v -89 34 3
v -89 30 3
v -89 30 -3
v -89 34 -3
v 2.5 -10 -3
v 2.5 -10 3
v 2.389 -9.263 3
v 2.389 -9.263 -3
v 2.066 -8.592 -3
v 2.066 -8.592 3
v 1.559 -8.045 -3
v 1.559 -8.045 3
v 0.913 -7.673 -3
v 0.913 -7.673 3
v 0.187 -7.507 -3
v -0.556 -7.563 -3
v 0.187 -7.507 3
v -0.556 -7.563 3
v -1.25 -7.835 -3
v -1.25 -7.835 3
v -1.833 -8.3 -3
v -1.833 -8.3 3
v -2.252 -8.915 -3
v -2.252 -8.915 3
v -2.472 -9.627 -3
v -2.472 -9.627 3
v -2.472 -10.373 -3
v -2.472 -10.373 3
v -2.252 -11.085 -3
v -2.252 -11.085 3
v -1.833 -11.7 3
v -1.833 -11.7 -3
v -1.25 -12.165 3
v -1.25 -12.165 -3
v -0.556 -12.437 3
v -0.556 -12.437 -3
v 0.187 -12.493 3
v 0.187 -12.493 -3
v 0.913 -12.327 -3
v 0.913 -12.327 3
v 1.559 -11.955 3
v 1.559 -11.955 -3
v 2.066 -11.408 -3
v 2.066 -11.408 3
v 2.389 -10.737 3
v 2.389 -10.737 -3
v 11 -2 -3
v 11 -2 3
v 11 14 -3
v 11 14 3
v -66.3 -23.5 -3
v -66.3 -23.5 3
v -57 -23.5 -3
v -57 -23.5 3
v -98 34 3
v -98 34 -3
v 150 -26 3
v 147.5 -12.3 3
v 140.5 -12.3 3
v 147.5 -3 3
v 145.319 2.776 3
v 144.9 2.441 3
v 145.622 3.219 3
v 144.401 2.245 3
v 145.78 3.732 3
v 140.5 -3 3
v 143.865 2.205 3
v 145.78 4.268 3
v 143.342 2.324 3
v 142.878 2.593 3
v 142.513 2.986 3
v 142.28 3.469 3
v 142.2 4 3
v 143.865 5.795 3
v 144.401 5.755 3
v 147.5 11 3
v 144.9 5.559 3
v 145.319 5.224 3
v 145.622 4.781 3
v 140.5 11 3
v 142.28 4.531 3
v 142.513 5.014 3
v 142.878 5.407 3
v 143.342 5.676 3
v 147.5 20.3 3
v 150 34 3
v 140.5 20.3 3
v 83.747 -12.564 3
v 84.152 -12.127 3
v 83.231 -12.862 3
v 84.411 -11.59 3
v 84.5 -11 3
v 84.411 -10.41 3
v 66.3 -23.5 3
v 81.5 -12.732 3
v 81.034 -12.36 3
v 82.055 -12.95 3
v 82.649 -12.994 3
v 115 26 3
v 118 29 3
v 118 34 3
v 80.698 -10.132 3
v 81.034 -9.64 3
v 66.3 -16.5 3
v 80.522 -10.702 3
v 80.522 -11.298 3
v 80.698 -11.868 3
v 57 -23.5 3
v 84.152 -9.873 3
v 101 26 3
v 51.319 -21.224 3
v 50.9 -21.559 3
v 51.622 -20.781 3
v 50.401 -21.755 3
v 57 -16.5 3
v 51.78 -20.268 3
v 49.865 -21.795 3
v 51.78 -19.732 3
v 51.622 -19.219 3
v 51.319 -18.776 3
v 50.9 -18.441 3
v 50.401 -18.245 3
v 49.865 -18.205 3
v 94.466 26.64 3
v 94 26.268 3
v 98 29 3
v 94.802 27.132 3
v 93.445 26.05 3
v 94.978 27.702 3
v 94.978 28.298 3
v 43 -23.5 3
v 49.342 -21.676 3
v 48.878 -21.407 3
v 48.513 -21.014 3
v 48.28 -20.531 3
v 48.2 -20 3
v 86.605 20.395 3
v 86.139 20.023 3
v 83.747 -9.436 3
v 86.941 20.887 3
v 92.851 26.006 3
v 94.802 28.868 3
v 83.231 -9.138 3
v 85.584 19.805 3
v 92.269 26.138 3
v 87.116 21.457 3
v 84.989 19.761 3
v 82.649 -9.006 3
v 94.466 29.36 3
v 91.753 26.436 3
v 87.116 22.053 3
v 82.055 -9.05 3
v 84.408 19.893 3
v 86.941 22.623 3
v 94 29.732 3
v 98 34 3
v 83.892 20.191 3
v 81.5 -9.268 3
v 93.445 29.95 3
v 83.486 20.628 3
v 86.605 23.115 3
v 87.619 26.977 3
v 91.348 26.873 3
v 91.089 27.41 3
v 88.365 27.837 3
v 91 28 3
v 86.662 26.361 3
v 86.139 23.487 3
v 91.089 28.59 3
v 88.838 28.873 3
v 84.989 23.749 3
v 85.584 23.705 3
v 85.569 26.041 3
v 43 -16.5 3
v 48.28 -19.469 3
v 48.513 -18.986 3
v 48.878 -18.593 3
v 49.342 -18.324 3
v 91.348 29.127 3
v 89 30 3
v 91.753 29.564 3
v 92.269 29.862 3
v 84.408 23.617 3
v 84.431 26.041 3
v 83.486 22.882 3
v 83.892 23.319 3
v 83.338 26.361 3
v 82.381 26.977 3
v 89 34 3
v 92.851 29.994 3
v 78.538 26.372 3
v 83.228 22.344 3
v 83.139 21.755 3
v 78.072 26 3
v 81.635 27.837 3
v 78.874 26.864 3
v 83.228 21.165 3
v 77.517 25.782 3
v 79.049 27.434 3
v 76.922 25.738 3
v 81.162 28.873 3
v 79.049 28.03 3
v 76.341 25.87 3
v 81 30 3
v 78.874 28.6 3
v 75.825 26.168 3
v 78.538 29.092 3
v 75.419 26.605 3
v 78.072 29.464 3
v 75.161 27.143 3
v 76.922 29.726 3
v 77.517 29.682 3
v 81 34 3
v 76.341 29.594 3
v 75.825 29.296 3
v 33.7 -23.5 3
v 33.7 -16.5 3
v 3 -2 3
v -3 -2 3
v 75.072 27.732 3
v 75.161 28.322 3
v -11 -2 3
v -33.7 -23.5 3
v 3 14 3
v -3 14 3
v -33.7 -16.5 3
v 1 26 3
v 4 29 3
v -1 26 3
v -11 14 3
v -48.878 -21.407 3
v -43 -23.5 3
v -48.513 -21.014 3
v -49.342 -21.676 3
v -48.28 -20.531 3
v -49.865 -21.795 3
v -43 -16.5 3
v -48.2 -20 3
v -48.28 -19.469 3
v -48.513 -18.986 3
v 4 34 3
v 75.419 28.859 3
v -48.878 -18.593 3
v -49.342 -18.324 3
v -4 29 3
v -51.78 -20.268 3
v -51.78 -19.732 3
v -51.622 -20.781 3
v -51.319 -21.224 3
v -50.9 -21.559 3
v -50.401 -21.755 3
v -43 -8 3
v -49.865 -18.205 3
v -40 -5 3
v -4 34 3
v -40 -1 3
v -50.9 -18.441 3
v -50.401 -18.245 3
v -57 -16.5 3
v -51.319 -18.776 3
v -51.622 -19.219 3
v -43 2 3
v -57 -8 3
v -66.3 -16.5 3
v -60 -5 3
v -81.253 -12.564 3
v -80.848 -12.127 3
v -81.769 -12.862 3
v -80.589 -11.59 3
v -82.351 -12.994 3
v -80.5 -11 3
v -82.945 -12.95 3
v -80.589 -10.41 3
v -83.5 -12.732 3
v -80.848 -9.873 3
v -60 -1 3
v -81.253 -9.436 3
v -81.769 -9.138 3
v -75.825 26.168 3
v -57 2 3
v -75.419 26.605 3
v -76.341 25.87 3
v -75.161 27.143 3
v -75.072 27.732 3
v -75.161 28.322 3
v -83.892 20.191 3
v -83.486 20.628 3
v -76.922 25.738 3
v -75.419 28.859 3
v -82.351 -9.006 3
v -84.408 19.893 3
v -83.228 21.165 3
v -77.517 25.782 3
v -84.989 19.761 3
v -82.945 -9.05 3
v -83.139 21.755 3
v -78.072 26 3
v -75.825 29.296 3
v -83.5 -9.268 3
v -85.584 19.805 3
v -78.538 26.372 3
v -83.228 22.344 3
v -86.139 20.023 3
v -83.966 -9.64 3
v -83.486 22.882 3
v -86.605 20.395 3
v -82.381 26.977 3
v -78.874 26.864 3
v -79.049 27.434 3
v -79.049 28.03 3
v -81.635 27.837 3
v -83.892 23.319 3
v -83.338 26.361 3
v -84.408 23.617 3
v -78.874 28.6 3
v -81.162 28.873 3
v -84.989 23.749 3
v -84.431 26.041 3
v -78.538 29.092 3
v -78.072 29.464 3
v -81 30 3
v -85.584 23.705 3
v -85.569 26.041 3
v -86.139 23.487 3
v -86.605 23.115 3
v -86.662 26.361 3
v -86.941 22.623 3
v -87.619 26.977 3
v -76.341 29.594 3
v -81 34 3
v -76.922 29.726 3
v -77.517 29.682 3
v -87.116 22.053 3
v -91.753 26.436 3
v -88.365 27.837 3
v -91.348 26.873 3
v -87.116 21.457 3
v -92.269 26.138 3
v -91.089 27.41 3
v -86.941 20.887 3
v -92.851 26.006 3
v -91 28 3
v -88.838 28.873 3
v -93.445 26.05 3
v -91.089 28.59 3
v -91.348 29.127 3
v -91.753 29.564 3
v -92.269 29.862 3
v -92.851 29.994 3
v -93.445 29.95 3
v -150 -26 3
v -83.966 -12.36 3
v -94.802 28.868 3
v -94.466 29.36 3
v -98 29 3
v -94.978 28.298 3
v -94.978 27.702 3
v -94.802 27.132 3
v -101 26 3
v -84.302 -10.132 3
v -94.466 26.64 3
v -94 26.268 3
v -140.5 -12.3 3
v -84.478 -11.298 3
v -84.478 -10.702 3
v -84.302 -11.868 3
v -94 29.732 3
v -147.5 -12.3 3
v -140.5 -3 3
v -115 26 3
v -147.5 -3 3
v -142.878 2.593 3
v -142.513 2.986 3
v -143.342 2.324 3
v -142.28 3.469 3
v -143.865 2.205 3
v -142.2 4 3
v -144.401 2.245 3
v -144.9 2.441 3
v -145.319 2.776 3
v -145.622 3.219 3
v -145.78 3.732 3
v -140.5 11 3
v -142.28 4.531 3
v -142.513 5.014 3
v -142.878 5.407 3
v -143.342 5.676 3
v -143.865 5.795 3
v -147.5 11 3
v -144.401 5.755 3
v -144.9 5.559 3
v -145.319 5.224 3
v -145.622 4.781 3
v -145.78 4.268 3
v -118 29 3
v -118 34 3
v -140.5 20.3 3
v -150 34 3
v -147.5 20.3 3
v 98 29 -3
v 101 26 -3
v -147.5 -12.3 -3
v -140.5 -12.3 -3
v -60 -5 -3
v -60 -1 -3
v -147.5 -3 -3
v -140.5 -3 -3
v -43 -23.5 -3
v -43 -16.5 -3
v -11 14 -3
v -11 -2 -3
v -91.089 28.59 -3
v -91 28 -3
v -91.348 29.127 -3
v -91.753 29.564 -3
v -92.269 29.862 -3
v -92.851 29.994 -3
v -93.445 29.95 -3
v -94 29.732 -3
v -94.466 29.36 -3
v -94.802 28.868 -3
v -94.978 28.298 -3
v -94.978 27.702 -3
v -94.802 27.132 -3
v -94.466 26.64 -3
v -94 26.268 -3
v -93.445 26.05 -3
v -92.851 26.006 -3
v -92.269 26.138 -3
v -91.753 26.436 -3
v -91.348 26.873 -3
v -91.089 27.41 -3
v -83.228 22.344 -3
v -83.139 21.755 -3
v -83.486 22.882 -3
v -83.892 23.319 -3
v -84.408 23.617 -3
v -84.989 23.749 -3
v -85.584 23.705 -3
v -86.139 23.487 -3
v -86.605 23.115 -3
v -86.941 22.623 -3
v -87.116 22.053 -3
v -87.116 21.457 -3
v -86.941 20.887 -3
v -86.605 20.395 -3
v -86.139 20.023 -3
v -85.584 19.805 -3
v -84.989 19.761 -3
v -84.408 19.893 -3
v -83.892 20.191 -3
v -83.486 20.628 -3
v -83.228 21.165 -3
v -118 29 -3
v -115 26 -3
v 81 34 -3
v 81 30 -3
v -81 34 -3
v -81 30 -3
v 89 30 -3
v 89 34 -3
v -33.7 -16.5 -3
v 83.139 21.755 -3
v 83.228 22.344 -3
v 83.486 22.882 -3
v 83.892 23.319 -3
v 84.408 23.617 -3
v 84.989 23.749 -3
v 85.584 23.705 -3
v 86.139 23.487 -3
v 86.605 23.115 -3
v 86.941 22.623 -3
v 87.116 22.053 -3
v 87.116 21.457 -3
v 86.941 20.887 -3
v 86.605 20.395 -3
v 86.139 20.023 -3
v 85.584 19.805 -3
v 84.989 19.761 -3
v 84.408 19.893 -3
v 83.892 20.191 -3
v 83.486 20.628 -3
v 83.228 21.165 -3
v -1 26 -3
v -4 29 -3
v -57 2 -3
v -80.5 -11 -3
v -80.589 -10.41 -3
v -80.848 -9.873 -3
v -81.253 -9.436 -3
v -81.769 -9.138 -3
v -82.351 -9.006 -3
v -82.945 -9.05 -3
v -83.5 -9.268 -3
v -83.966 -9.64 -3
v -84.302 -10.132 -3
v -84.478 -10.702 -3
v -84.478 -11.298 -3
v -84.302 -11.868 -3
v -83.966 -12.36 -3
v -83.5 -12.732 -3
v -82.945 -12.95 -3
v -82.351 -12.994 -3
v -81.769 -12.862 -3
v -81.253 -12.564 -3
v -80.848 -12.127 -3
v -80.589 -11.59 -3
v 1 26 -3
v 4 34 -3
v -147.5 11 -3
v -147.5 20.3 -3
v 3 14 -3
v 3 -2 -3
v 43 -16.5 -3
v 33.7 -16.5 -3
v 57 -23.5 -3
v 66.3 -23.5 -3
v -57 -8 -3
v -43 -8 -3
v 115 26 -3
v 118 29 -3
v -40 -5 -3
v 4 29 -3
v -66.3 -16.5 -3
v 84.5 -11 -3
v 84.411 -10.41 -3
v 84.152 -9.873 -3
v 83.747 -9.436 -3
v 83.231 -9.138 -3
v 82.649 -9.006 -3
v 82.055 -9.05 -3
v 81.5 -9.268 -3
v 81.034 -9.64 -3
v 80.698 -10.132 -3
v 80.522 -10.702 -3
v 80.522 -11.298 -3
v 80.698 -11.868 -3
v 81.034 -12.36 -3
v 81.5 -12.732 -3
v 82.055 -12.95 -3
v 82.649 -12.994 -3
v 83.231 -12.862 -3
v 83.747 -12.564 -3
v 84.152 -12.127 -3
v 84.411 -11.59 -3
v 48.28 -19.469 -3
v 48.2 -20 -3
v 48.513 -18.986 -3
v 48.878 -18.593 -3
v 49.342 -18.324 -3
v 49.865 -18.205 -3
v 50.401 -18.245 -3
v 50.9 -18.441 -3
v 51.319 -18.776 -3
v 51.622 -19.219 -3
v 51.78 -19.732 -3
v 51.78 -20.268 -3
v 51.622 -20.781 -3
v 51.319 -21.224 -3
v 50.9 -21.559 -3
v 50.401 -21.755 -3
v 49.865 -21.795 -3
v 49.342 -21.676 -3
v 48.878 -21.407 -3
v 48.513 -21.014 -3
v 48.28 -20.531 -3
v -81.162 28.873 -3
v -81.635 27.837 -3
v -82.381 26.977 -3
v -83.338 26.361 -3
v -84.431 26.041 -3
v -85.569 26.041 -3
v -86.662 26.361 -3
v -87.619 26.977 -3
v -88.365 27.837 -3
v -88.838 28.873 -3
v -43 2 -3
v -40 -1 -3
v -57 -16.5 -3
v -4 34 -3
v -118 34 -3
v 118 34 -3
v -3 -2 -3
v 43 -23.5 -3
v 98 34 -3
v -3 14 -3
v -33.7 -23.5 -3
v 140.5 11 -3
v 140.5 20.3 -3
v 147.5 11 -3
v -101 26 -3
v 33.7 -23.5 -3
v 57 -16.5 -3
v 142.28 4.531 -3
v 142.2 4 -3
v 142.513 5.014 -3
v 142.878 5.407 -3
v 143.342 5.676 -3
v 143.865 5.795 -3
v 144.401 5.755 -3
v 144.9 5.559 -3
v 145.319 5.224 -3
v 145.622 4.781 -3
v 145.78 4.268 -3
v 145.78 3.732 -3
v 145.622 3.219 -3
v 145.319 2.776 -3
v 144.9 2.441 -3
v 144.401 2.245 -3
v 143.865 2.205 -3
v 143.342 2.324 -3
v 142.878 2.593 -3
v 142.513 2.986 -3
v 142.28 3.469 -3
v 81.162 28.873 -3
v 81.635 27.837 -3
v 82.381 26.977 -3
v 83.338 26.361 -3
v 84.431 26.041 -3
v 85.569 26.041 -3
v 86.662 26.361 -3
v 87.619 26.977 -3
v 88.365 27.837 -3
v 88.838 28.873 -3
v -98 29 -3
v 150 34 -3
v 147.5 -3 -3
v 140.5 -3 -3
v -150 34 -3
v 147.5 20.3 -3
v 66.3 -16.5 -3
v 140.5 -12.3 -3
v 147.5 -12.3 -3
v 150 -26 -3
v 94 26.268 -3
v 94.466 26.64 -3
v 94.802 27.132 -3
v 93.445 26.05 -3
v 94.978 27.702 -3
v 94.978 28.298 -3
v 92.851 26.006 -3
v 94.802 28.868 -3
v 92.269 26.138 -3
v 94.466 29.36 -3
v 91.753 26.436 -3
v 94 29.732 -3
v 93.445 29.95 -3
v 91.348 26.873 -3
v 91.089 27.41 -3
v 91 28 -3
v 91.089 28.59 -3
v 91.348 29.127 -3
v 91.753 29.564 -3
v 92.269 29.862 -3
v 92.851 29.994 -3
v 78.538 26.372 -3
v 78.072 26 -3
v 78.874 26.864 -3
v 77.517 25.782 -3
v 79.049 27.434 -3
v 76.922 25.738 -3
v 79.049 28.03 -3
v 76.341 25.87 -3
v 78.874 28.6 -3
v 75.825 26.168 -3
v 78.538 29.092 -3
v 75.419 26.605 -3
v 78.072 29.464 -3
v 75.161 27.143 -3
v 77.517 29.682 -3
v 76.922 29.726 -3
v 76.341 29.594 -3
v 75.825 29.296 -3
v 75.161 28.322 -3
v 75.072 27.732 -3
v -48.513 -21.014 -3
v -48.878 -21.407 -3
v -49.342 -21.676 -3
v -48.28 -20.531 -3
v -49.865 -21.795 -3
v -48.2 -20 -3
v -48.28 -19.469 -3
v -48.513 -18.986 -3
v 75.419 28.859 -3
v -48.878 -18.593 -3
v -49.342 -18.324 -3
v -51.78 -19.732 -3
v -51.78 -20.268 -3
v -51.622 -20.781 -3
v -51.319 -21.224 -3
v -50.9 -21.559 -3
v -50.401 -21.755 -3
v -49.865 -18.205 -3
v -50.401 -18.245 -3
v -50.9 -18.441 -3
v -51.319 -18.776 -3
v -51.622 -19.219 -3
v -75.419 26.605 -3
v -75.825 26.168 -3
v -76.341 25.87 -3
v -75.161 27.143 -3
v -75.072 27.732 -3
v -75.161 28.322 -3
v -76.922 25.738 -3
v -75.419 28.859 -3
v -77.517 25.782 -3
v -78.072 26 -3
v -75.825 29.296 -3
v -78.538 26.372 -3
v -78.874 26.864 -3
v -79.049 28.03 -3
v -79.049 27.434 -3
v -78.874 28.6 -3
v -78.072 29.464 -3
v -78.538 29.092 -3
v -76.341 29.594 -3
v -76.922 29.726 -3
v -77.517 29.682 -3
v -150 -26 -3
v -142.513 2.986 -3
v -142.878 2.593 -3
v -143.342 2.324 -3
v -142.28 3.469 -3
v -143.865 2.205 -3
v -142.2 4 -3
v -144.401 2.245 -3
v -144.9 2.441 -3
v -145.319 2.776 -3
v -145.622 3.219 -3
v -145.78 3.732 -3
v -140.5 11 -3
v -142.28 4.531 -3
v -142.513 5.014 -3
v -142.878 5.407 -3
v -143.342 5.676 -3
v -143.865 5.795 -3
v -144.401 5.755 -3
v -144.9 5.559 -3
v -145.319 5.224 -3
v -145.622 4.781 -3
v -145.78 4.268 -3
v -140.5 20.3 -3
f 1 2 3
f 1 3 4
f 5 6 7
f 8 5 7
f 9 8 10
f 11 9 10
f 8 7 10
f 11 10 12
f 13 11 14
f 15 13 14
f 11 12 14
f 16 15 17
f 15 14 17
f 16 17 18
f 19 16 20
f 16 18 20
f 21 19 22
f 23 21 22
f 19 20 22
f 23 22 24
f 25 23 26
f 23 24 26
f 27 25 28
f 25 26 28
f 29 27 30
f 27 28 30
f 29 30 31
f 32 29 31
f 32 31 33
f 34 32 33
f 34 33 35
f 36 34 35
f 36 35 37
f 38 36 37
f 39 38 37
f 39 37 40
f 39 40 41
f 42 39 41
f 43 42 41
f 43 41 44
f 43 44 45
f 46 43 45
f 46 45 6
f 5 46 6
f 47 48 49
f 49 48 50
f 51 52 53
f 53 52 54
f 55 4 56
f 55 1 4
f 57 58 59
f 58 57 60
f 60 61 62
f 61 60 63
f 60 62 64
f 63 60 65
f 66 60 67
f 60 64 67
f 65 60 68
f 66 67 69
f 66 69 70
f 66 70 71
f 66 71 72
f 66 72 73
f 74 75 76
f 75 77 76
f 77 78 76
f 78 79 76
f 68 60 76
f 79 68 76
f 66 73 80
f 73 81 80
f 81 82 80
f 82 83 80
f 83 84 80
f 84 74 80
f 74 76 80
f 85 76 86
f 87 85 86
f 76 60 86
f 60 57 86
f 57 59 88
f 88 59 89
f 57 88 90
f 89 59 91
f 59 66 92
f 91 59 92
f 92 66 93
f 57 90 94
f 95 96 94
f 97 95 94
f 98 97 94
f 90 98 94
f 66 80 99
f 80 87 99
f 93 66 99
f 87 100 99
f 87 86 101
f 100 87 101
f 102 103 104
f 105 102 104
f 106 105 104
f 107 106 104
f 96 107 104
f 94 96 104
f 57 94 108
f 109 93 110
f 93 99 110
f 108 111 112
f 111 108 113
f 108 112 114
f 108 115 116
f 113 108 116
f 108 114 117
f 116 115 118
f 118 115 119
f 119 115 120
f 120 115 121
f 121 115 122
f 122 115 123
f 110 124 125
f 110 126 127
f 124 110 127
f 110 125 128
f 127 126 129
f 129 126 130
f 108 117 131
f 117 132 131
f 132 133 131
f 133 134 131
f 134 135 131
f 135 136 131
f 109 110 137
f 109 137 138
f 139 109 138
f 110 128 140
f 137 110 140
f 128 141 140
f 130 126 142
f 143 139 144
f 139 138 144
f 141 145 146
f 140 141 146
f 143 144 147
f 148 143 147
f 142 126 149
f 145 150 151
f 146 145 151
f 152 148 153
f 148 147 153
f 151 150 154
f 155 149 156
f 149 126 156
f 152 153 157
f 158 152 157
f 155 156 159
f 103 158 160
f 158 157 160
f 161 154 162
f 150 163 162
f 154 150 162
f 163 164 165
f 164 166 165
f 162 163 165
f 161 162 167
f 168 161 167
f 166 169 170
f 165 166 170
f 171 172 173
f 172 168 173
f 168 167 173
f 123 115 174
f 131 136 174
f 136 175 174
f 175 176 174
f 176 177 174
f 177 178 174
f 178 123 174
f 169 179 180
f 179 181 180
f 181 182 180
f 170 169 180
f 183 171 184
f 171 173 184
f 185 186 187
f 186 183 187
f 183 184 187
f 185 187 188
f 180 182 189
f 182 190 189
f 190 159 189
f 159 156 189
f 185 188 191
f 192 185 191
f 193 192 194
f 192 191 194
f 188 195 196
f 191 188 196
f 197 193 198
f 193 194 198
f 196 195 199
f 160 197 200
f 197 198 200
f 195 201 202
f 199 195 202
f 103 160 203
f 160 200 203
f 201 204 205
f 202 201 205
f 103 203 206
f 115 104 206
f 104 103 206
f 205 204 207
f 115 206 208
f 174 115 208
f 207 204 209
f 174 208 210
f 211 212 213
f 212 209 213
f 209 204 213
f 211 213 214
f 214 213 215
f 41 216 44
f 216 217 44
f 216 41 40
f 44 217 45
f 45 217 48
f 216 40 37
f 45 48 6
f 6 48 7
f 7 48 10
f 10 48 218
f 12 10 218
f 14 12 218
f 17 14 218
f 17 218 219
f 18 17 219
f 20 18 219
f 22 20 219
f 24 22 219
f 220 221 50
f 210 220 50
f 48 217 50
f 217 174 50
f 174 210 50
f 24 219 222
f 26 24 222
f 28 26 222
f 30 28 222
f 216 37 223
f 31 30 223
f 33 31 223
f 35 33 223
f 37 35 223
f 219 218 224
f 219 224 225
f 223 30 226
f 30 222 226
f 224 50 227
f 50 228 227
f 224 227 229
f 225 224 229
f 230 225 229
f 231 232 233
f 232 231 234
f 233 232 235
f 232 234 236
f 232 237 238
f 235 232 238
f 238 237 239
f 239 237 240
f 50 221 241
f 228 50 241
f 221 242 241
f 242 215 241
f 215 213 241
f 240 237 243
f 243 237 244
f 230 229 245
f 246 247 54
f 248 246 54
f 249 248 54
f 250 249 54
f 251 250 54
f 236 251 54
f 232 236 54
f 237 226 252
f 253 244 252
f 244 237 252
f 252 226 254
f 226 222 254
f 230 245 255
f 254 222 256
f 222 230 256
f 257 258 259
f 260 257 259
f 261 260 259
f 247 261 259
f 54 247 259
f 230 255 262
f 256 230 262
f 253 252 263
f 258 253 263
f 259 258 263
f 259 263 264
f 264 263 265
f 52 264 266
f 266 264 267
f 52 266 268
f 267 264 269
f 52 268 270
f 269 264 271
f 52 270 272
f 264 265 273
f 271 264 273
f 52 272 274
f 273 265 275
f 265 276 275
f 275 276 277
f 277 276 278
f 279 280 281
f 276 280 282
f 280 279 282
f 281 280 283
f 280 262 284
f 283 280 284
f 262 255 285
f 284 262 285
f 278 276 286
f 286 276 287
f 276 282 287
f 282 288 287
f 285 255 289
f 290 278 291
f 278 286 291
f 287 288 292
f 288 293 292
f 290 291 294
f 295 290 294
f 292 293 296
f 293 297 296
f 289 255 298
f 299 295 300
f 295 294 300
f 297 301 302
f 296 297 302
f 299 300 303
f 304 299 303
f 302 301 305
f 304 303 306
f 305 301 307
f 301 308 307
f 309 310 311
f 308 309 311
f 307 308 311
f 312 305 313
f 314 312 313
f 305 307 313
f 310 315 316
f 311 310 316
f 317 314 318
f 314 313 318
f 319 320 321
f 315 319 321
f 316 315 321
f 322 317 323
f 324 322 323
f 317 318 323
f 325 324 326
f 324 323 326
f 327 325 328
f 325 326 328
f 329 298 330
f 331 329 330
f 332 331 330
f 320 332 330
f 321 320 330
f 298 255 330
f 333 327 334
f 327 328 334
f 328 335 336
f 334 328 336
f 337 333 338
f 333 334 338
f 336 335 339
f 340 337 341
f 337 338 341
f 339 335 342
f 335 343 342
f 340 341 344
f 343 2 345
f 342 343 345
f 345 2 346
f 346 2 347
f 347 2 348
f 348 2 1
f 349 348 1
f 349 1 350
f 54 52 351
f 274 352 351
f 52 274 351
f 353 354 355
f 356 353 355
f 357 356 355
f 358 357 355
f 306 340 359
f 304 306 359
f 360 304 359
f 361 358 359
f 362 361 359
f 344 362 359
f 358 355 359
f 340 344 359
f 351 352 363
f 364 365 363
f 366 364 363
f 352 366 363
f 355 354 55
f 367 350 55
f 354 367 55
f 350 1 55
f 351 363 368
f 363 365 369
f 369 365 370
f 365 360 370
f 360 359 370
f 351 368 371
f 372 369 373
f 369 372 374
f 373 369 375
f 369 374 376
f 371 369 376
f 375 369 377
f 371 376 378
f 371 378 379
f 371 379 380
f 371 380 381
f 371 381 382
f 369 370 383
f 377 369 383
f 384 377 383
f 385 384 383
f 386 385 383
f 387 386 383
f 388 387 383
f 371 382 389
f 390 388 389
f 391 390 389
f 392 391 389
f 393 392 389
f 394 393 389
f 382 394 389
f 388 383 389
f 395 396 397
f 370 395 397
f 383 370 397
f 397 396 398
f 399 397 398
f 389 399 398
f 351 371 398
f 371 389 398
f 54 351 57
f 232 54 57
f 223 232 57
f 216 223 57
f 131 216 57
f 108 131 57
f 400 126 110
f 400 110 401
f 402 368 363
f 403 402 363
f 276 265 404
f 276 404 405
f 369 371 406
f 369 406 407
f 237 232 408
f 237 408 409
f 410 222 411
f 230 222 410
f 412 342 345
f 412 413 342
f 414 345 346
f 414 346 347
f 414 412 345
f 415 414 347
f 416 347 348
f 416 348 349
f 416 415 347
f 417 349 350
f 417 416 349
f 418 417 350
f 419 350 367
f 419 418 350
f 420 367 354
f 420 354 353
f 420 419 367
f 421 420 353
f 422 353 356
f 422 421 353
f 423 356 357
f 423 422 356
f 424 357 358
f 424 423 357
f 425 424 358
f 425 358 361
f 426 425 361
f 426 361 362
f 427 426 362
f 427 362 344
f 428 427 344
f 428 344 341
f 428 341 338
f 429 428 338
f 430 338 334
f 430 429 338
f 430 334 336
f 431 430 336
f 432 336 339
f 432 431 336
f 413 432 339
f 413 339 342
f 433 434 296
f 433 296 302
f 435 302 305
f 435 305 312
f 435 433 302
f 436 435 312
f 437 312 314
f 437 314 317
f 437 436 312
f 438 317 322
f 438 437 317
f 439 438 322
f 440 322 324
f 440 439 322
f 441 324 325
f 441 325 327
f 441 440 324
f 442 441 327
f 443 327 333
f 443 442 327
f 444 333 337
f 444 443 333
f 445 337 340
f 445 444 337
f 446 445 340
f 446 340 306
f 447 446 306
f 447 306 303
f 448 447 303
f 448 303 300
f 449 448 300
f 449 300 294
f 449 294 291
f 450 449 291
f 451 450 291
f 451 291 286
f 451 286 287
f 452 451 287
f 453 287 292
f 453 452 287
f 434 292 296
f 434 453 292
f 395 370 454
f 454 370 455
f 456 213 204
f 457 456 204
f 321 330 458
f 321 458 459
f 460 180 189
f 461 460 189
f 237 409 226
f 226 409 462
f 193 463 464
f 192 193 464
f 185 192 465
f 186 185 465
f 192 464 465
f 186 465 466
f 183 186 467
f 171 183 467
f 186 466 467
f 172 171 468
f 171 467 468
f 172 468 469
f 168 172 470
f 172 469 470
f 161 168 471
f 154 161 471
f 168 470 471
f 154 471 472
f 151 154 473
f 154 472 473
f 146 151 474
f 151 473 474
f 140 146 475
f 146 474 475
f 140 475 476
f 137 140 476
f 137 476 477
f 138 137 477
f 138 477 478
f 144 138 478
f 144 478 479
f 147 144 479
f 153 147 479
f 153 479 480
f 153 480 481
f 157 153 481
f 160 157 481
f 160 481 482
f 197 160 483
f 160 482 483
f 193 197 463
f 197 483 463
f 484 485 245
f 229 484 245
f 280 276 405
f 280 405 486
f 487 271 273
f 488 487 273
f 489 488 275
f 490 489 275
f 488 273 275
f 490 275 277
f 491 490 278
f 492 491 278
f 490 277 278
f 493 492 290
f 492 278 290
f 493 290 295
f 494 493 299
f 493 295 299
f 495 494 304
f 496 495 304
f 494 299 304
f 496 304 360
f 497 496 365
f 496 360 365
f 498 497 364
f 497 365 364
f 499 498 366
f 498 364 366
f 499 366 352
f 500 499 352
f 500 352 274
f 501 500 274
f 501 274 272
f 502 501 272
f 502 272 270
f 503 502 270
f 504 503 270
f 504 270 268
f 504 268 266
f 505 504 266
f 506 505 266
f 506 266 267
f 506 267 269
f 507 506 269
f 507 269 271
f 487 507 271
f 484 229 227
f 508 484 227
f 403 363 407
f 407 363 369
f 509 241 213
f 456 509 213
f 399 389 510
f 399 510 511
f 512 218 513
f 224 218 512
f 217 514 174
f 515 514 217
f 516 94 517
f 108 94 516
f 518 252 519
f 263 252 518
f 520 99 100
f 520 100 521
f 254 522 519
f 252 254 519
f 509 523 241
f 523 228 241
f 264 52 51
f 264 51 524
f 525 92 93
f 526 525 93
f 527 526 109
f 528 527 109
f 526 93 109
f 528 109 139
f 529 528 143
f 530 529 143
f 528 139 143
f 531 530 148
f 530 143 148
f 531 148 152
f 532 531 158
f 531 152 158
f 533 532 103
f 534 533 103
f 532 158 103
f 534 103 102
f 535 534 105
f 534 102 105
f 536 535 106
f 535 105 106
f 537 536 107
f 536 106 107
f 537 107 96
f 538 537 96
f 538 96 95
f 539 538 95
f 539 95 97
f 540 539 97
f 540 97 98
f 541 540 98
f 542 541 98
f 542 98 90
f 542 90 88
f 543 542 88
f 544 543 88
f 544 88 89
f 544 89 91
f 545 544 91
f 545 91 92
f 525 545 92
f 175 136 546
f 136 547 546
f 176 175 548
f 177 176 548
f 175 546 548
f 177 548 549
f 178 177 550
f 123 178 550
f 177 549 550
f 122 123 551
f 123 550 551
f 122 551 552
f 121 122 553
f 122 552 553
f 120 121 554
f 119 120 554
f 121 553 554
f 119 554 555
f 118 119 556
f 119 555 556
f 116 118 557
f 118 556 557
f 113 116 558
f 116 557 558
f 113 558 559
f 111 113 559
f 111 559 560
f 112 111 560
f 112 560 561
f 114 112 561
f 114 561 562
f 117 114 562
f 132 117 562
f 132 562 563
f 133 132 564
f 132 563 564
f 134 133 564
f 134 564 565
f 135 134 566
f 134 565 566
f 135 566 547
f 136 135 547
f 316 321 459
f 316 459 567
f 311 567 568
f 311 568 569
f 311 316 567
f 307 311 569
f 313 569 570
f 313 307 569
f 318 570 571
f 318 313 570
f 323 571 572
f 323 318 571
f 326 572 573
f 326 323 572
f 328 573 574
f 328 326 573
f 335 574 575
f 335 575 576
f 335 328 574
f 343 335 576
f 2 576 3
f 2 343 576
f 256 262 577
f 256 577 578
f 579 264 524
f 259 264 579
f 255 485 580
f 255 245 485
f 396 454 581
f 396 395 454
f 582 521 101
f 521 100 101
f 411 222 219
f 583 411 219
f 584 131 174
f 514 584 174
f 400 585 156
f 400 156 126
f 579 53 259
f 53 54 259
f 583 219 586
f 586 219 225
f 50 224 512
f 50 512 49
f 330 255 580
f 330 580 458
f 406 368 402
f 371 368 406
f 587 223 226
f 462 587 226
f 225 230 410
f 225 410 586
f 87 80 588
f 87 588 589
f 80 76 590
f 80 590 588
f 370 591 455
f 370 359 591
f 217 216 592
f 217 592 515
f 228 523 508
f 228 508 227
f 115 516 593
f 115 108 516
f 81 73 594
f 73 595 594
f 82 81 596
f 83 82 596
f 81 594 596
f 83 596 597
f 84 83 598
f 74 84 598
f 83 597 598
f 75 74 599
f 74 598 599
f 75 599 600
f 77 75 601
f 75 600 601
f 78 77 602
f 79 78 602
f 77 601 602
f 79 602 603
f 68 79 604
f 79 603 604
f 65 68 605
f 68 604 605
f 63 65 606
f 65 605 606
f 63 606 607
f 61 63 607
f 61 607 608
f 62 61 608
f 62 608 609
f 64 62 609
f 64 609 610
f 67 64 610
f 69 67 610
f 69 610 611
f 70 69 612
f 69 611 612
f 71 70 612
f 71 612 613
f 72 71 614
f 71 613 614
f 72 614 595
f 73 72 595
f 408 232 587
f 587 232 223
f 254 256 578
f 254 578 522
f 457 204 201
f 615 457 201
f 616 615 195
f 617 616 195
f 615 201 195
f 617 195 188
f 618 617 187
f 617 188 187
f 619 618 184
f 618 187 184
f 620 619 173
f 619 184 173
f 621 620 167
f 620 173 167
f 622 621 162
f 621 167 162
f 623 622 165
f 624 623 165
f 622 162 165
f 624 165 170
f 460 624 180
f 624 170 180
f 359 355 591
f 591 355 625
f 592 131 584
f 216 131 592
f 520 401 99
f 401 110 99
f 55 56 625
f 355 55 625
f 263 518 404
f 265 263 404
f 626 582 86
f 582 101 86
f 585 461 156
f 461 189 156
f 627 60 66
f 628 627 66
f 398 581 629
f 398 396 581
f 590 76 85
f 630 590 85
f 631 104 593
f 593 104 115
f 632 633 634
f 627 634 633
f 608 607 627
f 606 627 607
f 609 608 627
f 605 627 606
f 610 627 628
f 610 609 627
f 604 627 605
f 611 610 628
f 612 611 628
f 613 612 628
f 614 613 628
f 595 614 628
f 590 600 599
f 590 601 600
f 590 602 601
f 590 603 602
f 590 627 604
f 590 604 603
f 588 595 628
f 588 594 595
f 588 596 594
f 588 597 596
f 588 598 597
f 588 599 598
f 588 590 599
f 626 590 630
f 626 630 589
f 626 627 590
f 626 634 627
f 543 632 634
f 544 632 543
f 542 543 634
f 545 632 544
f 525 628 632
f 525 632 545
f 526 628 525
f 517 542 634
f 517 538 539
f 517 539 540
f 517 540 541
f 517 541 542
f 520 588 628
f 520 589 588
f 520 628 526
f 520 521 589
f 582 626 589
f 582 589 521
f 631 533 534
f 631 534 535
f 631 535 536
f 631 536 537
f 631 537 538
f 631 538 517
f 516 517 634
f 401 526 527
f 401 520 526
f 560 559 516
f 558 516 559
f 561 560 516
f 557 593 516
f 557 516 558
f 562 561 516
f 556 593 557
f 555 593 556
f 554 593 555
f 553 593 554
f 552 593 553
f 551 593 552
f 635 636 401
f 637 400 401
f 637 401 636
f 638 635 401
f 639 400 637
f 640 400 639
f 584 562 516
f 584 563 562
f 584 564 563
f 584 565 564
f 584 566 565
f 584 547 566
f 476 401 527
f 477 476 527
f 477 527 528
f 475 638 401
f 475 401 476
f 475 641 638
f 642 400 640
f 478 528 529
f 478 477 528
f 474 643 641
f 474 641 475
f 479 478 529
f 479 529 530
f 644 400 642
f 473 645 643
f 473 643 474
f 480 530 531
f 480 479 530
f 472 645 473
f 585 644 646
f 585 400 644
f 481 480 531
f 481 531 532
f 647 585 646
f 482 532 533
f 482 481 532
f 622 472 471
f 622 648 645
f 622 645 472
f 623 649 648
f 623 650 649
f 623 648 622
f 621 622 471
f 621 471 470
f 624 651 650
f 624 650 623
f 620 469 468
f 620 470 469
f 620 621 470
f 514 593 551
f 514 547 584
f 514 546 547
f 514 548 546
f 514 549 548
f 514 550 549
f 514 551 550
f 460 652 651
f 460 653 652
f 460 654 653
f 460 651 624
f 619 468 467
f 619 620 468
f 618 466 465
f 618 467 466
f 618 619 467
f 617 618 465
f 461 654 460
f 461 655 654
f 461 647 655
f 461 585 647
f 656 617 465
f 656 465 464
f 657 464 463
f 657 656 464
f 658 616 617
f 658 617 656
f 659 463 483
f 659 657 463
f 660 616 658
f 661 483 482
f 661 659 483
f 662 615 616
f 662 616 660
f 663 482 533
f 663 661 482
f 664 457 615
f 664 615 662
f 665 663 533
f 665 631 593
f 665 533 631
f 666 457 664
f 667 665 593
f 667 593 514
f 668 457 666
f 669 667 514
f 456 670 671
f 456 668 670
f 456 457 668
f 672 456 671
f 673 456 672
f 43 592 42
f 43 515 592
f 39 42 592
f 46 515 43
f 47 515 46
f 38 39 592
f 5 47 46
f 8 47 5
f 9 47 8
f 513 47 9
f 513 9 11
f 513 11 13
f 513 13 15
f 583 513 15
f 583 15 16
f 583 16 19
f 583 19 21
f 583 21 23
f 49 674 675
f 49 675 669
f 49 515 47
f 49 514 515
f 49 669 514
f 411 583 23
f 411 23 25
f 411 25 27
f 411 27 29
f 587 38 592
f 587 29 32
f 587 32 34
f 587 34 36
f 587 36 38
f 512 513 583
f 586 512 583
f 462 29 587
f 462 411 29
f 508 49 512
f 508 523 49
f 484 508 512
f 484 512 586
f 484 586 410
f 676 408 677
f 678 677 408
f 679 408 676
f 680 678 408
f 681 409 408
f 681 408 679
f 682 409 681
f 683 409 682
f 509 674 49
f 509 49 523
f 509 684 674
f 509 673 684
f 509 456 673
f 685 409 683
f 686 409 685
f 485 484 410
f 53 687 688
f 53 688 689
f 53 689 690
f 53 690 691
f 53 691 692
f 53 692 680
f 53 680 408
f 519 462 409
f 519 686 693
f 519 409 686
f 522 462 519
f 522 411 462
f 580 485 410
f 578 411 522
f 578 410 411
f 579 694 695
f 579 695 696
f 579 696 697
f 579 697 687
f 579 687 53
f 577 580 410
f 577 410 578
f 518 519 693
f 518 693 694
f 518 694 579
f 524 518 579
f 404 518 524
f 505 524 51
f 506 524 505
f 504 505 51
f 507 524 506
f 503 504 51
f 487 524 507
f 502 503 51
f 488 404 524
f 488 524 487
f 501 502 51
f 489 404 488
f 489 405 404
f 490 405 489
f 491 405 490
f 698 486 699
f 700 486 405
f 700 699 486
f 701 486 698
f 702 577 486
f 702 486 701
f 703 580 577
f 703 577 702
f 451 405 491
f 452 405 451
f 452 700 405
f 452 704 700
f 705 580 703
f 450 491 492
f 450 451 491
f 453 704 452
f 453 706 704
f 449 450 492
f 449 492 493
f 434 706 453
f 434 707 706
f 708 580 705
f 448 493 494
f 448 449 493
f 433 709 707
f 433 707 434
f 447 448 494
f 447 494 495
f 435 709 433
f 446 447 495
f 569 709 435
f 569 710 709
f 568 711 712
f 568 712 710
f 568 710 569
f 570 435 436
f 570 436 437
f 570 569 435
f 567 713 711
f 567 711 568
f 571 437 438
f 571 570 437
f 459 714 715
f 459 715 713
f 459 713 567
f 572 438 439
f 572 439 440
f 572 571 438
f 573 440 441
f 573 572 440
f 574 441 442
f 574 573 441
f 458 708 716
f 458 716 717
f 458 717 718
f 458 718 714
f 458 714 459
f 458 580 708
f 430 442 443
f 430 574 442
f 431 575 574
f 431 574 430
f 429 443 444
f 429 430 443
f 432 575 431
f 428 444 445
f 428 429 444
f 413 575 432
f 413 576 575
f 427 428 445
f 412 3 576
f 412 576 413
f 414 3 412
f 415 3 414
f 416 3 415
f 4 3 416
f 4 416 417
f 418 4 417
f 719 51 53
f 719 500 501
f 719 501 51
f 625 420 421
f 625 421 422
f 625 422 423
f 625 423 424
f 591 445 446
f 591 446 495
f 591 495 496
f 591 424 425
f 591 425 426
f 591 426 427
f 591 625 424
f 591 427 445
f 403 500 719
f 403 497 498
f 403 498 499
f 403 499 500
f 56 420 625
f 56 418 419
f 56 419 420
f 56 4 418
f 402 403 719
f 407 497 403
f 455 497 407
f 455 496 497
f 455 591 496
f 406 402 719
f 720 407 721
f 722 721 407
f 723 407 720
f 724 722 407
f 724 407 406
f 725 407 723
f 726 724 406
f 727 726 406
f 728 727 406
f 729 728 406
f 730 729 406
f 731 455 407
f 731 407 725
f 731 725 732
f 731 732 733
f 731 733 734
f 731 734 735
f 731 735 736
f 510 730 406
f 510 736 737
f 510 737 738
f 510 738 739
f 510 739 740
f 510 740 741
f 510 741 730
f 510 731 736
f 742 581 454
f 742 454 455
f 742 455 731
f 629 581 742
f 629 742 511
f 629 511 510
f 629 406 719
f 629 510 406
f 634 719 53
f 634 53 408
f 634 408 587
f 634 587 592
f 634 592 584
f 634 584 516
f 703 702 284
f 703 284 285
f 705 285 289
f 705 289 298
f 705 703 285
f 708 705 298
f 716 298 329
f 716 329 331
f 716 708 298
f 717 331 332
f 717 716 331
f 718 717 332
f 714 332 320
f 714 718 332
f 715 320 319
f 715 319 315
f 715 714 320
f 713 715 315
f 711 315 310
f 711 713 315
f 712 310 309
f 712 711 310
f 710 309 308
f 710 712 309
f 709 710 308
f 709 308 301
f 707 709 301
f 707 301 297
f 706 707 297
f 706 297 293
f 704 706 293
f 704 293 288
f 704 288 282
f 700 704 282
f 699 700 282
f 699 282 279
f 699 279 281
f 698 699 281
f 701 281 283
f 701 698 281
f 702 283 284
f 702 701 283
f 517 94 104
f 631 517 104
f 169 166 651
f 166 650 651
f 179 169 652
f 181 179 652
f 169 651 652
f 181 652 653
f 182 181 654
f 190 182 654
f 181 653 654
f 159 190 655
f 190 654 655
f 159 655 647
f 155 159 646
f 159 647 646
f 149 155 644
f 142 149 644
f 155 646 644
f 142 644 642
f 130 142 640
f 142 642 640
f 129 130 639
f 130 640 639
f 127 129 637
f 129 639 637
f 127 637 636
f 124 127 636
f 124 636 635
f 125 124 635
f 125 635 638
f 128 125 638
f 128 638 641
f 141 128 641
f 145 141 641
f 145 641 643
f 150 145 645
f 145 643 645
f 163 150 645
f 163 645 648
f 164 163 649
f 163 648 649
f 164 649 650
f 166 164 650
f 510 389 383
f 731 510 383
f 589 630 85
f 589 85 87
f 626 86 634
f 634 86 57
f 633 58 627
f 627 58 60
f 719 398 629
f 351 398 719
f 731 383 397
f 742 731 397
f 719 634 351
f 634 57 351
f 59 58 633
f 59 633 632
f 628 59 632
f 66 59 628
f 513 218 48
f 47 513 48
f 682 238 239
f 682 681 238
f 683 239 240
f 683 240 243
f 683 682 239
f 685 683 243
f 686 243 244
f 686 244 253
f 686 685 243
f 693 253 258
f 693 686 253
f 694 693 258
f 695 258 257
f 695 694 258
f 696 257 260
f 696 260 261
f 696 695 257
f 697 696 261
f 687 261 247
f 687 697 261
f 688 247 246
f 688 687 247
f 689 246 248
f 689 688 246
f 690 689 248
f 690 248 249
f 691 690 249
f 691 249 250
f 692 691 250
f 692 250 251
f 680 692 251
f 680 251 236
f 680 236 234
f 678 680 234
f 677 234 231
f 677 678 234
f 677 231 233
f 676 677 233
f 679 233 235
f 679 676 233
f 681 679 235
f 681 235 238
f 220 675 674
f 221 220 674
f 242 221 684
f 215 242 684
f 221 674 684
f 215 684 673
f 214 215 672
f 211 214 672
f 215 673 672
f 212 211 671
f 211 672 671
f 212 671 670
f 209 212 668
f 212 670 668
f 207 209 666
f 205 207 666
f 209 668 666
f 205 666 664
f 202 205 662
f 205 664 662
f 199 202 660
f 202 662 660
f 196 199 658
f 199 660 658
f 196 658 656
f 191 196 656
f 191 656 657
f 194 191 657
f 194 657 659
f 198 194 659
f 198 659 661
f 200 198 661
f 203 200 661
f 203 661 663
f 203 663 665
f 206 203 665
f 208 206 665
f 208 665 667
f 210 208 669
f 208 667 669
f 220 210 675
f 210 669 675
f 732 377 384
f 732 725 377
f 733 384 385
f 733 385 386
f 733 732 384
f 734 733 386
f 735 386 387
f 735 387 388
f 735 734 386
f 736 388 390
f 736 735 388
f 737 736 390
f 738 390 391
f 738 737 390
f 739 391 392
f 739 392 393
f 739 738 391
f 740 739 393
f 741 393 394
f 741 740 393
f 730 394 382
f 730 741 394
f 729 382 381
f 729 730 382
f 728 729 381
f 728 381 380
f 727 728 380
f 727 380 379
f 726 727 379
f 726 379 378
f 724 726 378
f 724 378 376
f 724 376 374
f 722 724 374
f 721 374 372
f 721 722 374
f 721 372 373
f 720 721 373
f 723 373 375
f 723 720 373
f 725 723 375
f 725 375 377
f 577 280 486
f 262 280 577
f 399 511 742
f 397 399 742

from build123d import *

# Parameters (mm, degrees)
ESQUISSE1_R                      = 2
ESQUISSE1_R_2                    = 1.8
ESQUISSE1_W                      = 7
ESQUISSE1_H                      = 9.3
ESQUISSE1_W_2                    = 9.3
ESQUISSE1_H_2                    = 7
BOSS_EXTRU_1_DEPTH               = 3
R_P_TITION_START                 = -3
R_P_TITION_CIRCULAIRE1_OUTLINE_R = 2
R_P_TITION_CIRCULAIRE1_DEPTH     = 6
CHANFREIN1_SIZE                  = 3
IDLER_REACH                      = 155.922
ESQUISSE2_R                      = 2.5
ESQUISSE2_W                      = 8
ESQUISSE2_H                      = 16
SCREEN_REACH                     = 155.922
ESQUISSE3_R                      = 2


# Read off the part's stored shape, not the designer's step: Répétition circulaire1
with BuildPart() as part:
    # Esquisse1 → Boss.-Extru.1 (new, symmetric)
    with BuildSketch(Plane.XY):
        with BuildLine():
            Line((-150, -26), (0, -26))
            Line((0, -26), (0, 26))
            Line((0, 26), (-4, 26))
            Line((-4, 26), (-4, 34))
            Line((-4, 34), (-81, 34))
            Line((-81, 34), (-81, 30))
            ThreePointArc((-81, 30), (-85, 26), (-89, 30))
            Line((-89, 30), (-89, 34))
            Line((-89, 34), (-98, 34))
            Line((-98, 34), (-98, 26))
            Line((-98, 26), (-118, 26))
            Line((-118, 26), (-118, 34))
            Line((-118, 34), (-150, 34))
            Line((-150, 34), (-150, -26))
        make_face()
        with Locations((-93, 28)):
            Circle(ESQUISSE1_R, mode=Mode.SUBTRACT)
        with Locations((-144, 4)):
            Circle(ESQUISSE1_R_2, mode=Mode.SUBTRACT)
        with Locations((-50, -20)):
            Circle(ESQUISSE1_R_2, mode=Mode.SUBTRACT)
        with Locations((-144, 15.65)):
            Rectangle(ESQUISSE1_W, ESQUISSE1_H, mode=Mode.SUBTRACT)
        with Locations((-144, -7.65)):
            Rectangle(ESQUISSE1_W, ESQUISSE1_H, mode=Mode.SUBTRACT)
        with Locations((-38.35, -20)):
            Rectangle(ESQUISSE1_W_2, ESQUISSE1_H_2, mode=Mode.SUBTRACT)
        with Locations((-61.65, -20)):
            Rectangle(ESQUISSE1_W_2, ESQUISSE1_H_2, mode=Mode.SUBTRACT)
    extrude(amount=BOSS_EXTRU_1_DEPTH, both=True)

    # Répétition circulaire1 outline → Répétition circulaire1 (cut)
    with BuildSketch(Plane.XY.offset(R_P_TITION_START)):
        with Locations((-77.07179677, 27.732050808)):
            Circle(R_P_TITION_CIRCULAIRE1_OUTLINE_R)
        with Locations((-85.138700708, 21.754955299)):
            Circle(R_P_TITION_CIRCULAIRE1_OUTLINE_R)
    extrude(amount=R_P_TITION_CIRCULAIRE1_DEPTH, mode=Mode.SUBTRACT)

    # Chanfrein1
    chanfrein1_edges = [part.edges().sort_by_distance(p)[0] for p in [
        (-118, 26, 0),
        (-98, 26, 0),
        (-4, 26, 0),
    ]]
    chamfer(chanfrein1_edges, length=CHANFREIN1_SIZE)

    # Symétrie2: part across plane


with BuildPart() as part_1:
    add(part.part)
    add(part.part.mirror(Plane(origin=(0, 26, 3), x_dir=(0, 0, 1), z_dir=(-1, 0, 0))))

    # Esquisse2 → idler (cut, up to next)
    with BuildSketch(Plane.XY.offset(3), mode=Mode.PRIVATE) as idler_sk1:
        with Locations((0, -10)):
            Circle(ESQUISSE2_R)
    idler_tool1 = extrude(idler_sk1.sketch, amount=-IDLER_REACH, mode=Mode.PRIVATE) & part_1.part
    # Esquisse2 → idler (cut, up to next)
    with BuildSketch(Plane.XY.offset(3), mode=Mode.PRIVATE) as idler_sk2:
        with Locations((-7, 6)):
            Rectangle(ESQUISSE2_W, ESQUISSE2_H)
    idler_tool2 = extrude(idler_sk2.sketch, amount=-IDLER_REACH, mode=Mode.PRIVATE) & part_1.part
    # Esquisse2 → idler (cut, up to next)
    with BuildSketch(Plane.XY.offset(3), mode=Mode.PRIVATE) as idler_sk3:
        with Locations((7, 6)):
            Rectangle(ESQUISSE2_W, ESQUISSE2_H)
    idler_tool3 = extrude(idler_sk3.sketch, amount=-IDLER_REACH, mode=Mode.PRIVATE) & part_1.part
    add(idler_tool1.solids().sort_by_distance((0, -10, 3))[0], mode=Mode.SUBTRACT)
    add(idler_tool2.solids().sort_by_distance((-7, 6, 3))[0], mode=Mode.SUBTRACT)
    add(idler_tool3.solids().sort_by_distance((7, 6, 3))[0], mode=Mode.SUBTRACT)

    # Esquisse3 → screen (cut, up to next)
    with BuildSketch(Plane.XY.offset(3), mode=Mode.PRIVATE) as screen_sk1:
        with Locations((-82.5, -11)):
            Circle(ESQUISSE3_R)
    screen_tool1 = extrude(screen_sk1.sketch, amount=-SCREEN_REACH, mode=Mode.PRIVATE) & part_1.part
    # Esquisse3 → screen (cut, up to next)
    with BuildSketch(Plane.XY.offset(3), mode=Mode.PRIVATE) as screen_sk2:
        with Locations((82.5, -11)):
            Circle(ESQUISSE3_R)
    screen_tool2 = extrude(screen_sk2.sketch, amount=-SCREEN_REACH, mode=Mode.PRIVATE) & part_1.part
    # Esquisse3 → screen (cut, up to next)
    with BuildSketch(Plane.XY.offset(3), mode=Mode.PRIVATE) as screen_sk3:
        Polygon((-59.999999802, -1), (-56.999999802, 2), (-42.999999802, 2), (-39.999999802, -1), (-39.999999802, -5), (-42.999999802, -8), (-56.999999802, -8), (-59.999999802, -5), align=None)
    screen_tool3 = extrude(screen_sk3.sketch, amount=-SCREEN_REACH, mode=Mode.PRIVATE) & part_1.part
    add(screen_tool1.solids().sort_by_distance((-82.5, -11, 3))[0], mode=Mode.SUBTRACT)
    add(screen_tool2.solids().sort_by_distance((82.5, -11, 3))[0], mode=Mode.SUBTRACT)
    add(screen_tool3.solids().sort_by_distance((-50, -3, 3))[0], mode=Mode.SUBTRACT)


solid = part_1.part
